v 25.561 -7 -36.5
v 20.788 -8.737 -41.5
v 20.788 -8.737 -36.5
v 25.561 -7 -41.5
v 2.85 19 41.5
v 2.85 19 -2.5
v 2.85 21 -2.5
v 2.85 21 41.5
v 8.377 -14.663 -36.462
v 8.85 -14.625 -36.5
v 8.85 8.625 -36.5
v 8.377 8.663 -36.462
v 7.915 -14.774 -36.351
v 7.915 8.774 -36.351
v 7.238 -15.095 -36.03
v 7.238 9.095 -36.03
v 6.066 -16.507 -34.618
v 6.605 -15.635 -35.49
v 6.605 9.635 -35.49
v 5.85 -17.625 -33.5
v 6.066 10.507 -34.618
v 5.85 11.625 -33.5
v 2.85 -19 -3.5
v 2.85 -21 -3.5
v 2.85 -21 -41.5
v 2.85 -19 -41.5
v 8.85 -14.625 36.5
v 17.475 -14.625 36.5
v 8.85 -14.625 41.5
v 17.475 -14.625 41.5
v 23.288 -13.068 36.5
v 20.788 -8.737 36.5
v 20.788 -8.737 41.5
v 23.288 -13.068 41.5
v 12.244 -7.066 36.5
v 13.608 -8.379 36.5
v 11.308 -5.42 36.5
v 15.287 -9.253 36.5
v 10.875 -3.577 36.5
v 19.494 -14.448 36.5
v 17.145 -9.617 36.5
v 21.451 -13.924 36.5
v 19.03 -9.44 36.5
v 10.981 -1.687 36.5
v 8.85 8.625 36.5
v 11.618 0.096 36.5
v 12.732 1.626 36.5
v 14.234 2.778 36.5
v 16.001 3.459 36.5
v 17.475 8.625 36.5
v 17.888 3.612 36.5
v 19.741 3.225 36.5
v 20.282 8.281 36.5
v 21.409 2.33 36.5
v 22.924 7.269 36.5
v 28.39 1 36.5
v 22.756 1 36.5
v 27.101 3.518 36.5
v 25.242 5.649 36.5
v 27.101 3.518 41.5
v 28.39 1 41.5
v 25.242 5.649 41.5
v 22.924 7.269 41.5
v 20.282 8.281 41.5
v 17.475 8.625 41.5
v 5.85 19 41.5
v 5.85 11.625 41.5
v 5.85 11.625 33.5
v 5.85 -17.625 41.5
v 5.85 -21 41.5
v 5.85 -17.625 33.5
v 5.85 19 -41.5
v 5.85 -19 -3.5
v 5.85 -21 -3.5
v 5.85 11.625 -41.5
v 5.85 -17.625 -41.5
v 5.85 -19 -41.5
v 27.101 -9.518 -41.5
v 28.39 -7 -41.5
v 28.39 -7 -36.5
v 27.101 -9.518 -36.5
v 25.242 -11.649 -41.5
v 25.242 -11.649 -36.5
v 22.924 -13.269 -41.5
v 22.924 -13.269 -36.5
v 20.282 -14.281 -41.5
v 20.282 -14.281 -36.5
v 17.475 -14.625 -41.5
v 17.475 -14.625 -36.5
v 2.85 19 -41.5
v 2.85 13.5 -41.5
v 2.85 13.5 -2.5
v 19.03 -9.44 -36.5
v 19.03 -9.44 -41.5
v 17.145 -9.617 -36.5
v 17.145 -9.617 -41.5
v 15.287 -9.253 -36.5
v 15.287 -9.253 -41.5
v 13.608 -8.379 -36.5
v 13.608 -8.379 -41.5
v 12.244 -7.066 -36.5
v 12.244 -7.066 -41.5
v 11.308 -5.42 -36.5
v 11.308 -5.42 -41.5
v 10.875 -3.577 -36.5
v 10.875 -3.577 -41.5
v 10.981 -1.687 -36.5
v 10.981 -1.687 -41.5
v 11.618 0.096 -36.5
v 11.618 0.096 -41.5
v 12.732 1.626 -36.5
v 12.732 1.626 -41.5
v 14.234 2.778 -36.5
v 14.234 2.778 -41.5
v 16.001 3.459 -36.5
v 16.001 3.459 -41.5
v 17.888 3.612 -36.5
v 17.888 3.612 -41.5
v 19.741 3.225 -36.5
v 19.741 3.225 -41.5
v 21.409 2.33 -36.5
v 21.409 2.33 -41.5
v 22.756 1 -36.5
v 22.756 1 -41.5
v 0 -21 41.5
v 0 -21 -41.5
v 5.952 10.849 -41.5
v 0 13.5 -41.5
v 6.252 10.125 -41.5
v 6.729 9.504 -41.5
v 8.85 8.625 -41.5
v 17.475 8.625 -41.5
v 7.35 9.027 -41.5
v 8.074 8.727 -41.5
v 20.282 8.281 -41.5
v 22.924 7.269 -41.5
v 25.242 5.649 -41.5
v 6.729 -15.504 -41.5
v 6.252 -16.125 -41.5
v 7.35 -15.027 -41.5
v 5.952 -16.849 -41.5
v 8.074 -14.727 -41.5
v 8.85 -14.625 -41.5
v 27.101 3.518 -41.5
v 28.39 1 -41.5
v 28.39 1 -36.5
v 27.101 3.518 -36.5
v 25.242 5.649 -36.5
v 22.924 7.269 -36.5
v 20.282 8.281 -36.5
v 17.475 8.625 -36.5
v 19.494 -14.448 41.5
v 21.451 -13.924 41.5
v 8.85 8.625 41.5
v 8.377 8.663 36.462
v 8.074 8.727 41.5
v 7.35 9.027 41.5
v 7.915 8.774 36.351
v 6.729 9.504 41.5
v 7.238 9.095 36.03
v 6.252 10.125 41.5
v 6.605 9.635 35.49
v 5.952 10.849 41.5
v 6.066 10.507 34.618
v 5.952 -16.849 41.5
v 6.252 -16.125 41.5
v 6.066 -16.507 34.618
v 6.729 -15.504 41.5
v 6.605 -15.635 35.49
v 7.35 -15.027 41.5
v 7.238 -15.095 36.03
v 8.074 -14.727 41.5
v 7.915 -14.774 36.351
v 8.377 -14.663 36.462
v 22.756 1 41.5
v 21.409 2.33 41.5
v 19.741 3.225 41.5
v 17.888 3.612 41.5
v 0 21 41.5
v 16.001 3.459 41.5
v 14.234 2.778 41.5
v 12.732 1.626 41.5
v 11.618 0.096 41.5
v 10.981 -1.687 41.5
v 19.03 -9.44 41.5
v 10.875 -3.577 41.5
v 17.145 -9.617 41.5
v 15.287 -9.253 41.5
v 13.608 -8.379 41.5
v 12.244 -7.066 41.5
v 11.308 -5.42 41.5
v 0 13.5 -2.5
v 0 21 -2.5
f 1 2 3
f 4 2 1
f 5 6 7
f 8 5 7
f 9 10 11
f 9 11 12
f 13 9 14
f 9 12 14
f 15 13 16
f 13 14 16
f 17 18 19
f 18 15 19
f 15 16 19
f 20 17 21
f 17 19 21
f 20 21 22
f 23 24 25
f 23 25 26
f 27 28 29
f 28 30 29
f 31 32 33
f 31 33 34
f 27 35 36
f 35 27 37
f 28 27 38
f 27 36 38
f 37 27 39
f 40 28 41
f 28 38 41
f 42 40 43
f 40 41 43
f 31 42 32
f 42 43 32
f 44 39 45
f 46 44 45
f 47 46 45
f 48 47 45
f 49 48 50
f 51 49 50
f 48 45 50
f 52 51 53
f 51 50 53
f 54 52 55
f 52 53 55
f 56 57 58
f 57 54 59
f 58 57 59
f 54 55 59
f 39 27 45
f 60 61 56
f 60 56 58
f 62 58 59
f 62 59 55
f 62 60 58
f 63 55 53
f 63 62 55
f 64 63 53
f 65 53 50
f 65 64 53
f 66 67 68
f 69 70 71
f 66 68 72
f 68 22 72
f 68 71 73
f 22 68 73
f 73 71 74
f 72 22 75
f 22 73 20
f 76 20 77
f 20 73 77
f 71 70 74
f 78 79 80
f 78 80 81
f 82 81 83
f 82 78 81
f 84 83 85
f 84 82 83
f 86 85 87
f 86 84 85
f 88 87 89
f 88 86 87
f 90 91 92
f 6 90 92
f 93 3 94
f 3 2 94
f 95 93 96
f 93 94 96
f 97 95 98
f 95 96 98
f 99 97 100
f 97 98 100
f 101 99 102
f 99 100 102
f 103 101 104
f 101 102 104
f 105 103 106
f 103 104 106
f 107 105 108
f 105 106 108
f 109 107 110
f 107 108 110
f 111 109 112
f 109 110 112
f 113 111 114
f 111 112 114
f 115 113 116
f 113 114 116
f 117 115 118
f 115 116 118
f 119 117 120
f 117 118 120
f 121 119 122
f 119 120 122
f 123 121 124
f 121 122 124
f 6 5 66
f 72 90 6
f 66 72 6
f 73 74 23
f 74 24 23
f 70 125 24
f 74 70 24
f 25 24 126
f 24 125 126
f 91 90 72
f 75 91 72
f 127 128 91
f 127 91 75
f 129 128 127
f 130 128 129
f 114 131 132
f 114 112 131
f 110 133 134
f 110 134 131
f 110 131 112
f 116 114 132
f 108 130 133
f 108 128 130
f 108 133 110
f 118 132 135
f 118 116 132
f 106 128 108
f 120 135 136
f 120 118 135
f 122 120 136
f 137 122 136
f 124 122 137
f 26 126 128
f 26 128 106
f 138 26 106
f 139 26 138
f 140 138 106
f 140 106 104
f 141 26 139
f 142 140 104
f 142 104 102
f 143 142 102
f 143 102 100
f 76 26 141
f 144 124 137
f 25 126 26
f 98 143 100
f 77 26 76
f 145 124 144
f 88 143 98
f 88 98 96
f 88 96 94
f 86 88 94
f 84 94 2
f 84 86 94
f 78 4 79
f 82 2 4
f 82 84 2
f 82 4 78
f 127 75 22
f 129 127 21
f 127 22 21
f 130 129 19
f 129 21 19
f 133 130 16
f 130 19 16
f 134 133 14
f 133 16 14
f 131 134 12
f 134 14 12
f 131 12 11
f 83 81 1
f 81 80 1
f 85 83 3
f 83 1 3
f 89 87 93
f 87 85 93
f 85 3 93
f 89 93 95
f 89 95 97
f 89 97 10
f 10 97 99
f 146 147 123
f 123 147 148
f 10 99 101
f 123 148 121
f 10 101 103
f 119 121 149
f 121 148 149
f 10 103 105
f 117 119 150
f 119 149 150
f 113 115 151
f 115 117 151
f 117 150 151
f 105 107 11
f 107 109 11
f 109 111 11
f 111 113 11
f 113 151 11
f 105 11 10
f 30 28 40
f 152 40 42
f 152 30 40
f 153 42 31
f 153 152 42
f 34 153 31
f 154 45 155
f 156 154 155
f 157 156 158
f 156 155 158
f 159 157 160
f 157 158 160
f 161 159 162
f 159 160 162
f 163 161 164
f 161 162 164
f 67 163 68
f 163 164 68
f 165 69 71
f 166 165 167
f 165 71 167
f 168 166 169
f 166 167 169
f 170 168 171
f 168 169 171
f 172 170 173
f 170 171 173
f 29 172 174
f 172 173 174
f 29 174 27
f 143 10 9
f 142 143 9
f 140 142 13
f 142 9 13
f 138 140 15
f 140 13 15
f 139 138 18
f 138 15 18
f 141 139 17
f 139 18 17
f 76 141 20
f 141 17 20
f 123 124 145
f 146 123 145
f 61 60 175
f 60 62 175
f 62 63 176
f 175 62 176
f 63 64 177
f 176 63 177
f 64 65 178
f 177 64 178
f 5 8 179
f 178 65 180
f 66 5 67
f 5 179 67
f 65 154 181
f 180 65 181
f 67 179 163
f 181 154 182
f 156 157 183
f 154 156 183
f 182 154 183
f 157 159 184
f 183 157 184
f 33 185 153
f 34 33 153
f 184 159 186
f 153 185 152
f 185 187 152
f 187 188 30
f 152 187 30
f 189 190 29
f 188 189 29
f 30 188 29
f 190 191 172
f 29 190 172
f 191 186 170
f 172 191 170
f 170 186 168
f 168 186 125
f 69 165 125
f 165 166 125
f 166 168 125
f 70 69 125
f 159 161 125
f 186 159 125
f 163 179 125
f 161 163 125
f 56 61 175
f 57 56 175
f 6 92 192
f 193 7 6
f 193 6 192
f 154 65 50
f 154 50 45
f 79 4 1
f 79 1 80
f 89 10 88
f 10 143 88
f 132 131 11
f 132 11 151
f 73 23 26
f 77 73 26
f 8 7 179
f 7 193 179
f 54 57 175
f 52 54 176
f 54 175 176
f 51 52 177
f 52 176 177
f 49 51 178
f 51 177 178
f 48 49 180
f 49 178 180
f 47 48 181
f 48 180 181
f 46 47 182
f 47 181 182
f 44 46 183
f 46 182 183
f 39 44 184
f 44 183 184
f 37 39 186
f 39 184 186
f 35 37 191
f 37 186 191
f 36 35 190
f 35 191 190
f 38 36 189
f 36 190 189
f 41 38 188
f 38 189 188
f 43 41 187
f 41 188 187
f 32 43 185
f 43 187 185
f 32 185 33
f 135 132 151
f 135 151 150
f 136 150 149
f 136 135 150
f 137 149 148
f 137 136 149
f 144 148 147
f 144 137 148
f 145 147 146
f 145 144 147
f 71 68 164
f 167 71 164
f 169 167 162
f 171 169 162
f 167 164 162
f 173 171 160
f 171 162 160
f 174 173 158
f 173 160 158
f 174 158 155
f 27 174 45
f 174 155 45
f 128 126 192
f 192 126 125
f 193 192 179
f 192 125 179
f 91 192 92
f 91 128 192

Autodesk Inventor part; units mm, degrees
ref_plane "YZ Plane" through (0, 0, 0) normal (1, 0, 0) x (0, 1, 0)
ref_plane "XZ Plane" through (0, 0, 0) normal (0, 1, 0) x (-1, 0, 0)
sketch "Sketch1" plane through (0, 0, 0) normal (1, 0, 0) x (0, 1, 0)
  line L0 (21, 41.5) -> (-21, 41.5)
  line L1 (-21, 41.5) -> (-21, -41.5)
  line L2 (-21, -41.5) -> (21, -41.5)
  line L3 (21, -41.5) -> (21, 41.5)
  point P0 (0, 0)
  dimension "d0" = 83
  dimension "d1" = 41.5
  dimension "d2" = 42
  dimension "d3" = 21
extrude "Extrusion1" add sketch "Sketch1" along normal blind 2.85
sketch "Sketch3" plane through (2.85, 0, 0) normal (1, 0, 0) x (0, 0, -1)
  line L0 (41.5, 21) -> (-41.5, 21) projected
  line L1 (-41.5, 21) -> (2.5, 21)
  line L2 (2.5, 21) -> (2.5, 19)
  line L3 (2.5, 19) -> (-41.5, 19)
  line L4 (-41.5, 19) -> (-41.5, 21)
  line L5 (-41.5, -21) -> (41.5, -21) projected
  line L6 (41.5, -21) -> (3.5, -21)
  line L7 (3.5, -21) -> (3.5, -19)
  line L8 (3.5, -19) -> (41.5, -19)
  line L9 (41.5, -19) -> (41.5, -21)
  line L10 (41.5, -21) -> (41.5, 21) projected
  line L11 (41.5, 21) -> (-41.5, 21) projected
  line L12 (-41.5, 21) -> (-41.5, -21) projected
  line L13 (-41.5, -21) -> (41.5, -21) projected
  point P0 (0, 0)
  point P1 (41.5, 21)
  dimension "d12" = 44
  dimension "d13" = 2
  dimension "d14" = 38
  dimension "d15" = 2
extrude "Extrusion3" add sketch "Sketch3" along normal blind 3 contours L10 L8 L7 L5 L12 L3 L2 L0
sketch "Sketch4" plane through (0, 21, 41.5) normal (0, 1, 0) x (1, 0, 0)
  line L0 (0, 83) -> (0, 0) projected
  line L1 (2.85, 44) -> (5.85, 44) projected
  line L2 (0, 83) -> (5.85, 83)
  line L3 (5.85, 83) -> (5.85, 44)
  line L4 (5.85, 44) -> (0, 44)
  line L5 (0, 44) -> (0, 83)
  point P0 (0, 41.5)
extrude "Extrusion4" cut sketch "Sketch4" against normal blind 7.5
sketch "Sketch5" plane through (0, -21, 41.5) normal (0, 0, 1) x (1, 0, 0)
  circle A0 centre (17.475, 18) radius 6.625
  circle A1 centre (17.475, 18) radius 11.625
  line L0 (5.85, 40) -> (5.85, 0) projected
  line L1 (5.85, 2) -> (5.85, 34.5) projected
  line L2 (2.85, 40) -> (5.85, 40) projected
  line L3 (17.475, 6.375) -> (5.85, 6.375)
  line L4 (28.3902, 22) -> (12.1938, 22)
  line L5 (28.3902, 14) -> (12.1938, 14)
  line L6 (17.475, 29.625) -> (5.85, 29.625)
  line L7 (17.475, 18) -> (5.85, 18)
  line L8 (0, 0) -> (5.85, 0) projected
  point P0 (0, 21)
  point P1 (22.7562, 14)
  point P2 (22.7562, 22)
  dimension "d20" = 13.25
  dimension "d21" = 5
  dimension "d30" = 18
  dimension "d31" = 4
  dimension "d32" = 4
extrude "Extrusion5" add sketch "Sketch5" against normal blind 5 contours A0 L7 A1 L4 | L5 A1 L7 A0 | A1 L0 L6 | L3 L0 A1
fillet "Fillet3" radius 3 3 edges at (5.85, -14.625, 39) (5.85, -3, 36.5) (5.85, 8.625, 39)
ref_plane "Work Plane1" through (2.85, -21, 0) normal (0, 0, -1) x (-1, 0, 0)
mirror "Mirror1" about plane through (2.85, -21, 0) normal (0, 0, -1) of "Extrusion5", "Fillet3"
sketch "Sketch6" plane through (0, -21, 36.5) normal (0, 0, -1) x (-1, 0, 0)
  line L0 (-8.85, 29.625) -> (-8.85, 6.375) projected
  line L1 (-8.85, 29.625) -> (-17.475, 29.625) projected
  arc A0 (-17.475, 29.625) -> (-28.3902, 22) centre (-17.475, 18) ccw projected
  line L2 (-28.3902, 22) -> (-22.7562, 22) projected
  arc A1 (-22.7562, 14) -> (-22.7562, 22) centre (-17.475, 18) ccw projected
  line L3 (-22.7562, 14) -> (-28.3902, 14) projected
  arc A2 (-28.3902, 14) -> (-17.475, 6.375) centre (-17.475, 18) ccw projected
  line L4 (-17.475, 6.375) -> (-8.85, 6.375) projected
  line L5 (-17.475, 18) -> (-23.2875, 28.0675)
  arc A3 (-17.475, 29.625) -> (-28.3902, 22) centre (-17.475, 18) ccw projected
  line L6 (-17.475, 18) -> (-5.85, 18) construction
  line L7 (-17.475, 18) -> (-23.2875, 7.9325)
  arc A4 (-28.3902, 14) -> (-17.475, 6.375) centre (-17.475, 18) ccw projected
  line L8 (-17.475, 18) -> (-5.85, 18) construction
  point P0 (0, 21)
  point P1 (-20.7875, 23.7374)
  point P2 (-20.7875, 12.2626)
  dimension "d33" = 120
  dimension "d42" = 120
extrude "Extrusion6" cut sketch "Sketch6" against normal blind 13.5 contours A2 L3 A1 L7
sketch "Sketch7" plane through (2.85, -21, -41.5) normal (0, 0, -1) x (-1, 0, 0)
  line L0 (2.85, 34.5) -> (-3, 34.5) projected
  line L1 (-3, 32.625) -> (-3, 34.5) projected
  arc A0 (-6, 29.625) -> (-3, 32.625) centre (-6, 32.625) ccw projected
  line L2 (-14.625, 29.625) -> (-6, 29.625) projected
  arc A1 (-14.625, 29.625) -> (-25.5402, 22) centre (-14.625, 18) ccw projected
  line L3 (-19.9062, 22) -> (-25.5402, 22) projected
  arc A2 (-19.9062, 14) -> (-19.9062, 22) centre (-14.625, 18) ccw projected
  line L4 (-25.5402, 14) -> (-19.9062, 14) projected
  arc A3 (-25.5402, 14) -> (-14.625, 6.375) centre (-14.625, 18) ccw projected
  line L5 (-6, 6.375) -> (-14.625, 6.375) projected
  arc A4 (-3, 3.375) -> (-6, 6.375) centre (-6, 3.375) ccw projected
  line L6 (-3, 2) -> (-3, 3.375) projected
  line L7 (0, 2) -> (-3, 2) projected
  line L8 (0, 0) -> (0, 2) projected
  line L9 (2.85, 0) -> (0, 0) projected
  line L10 (2.85, 0) -> (2.85, 34.5) projected
  arc A5 (-14.625, 29.625) -> (-25.5402, 22) centre (-14.625, 18) ccw projected
  line L11 (-19.9062, 22) -> (-25.5402, 22) projected
  line L12 (-14.625, 18) -> (-20.4375, 7.9325)
  arc A6 (-25.5402, 14) -> (-14.625, 6.375) centre (-14.625, 18) ccw projected
  line L13 (-14.625, 18) -> (-3, 18) construction
  line L14 (-25.5402, 14) -> (-19.9062, 14) projected
  arc A7 (-19.9062, 14) -> (-19.9062, 22) centre (-14.625, 18) ccw projected
  line L15 (-17.9375, 12.2626) -> (-22.711, 14)
  line L16 (-17.9375, 12.2626) -> (-12.8576, 12.2626) construction
  point P0 (2.85, 21)
  dimension "d43" = 120
  dimension "d44" = 160
extrude "Extrusion7" cut sketch "Sketch7" against normal blind 11.5 contours L15 L4 A2
sketch "Sketch8" plane through (0, 13.5, 41.5) normal (0, 1, 0) x (1, 0, 0)
  line L0 (2.85, 44) -> (0, 44) projected
  line L1 (0, 83) -> (5.85, 83) projected
  line L2 (2.85, 44) -> (5.85, 44)
  line L3 (5.85, 44) -> (5.85, 83)
  line L4 (5.85, 83) -> (2.85, 83)
  line L5 (2.85, 83) -> (2.85, 44)
  point P0 (0, 41.5)
extrude "Extrusion8" add sketch "Sketch8" along normal up to surface (5.5 mm away)
equation "\"d1\" = 0.5 * d0"
equation "\"d3\" = 0.5 * d2"
equation "\"d32\" = d31"
properties part number "Lid"
